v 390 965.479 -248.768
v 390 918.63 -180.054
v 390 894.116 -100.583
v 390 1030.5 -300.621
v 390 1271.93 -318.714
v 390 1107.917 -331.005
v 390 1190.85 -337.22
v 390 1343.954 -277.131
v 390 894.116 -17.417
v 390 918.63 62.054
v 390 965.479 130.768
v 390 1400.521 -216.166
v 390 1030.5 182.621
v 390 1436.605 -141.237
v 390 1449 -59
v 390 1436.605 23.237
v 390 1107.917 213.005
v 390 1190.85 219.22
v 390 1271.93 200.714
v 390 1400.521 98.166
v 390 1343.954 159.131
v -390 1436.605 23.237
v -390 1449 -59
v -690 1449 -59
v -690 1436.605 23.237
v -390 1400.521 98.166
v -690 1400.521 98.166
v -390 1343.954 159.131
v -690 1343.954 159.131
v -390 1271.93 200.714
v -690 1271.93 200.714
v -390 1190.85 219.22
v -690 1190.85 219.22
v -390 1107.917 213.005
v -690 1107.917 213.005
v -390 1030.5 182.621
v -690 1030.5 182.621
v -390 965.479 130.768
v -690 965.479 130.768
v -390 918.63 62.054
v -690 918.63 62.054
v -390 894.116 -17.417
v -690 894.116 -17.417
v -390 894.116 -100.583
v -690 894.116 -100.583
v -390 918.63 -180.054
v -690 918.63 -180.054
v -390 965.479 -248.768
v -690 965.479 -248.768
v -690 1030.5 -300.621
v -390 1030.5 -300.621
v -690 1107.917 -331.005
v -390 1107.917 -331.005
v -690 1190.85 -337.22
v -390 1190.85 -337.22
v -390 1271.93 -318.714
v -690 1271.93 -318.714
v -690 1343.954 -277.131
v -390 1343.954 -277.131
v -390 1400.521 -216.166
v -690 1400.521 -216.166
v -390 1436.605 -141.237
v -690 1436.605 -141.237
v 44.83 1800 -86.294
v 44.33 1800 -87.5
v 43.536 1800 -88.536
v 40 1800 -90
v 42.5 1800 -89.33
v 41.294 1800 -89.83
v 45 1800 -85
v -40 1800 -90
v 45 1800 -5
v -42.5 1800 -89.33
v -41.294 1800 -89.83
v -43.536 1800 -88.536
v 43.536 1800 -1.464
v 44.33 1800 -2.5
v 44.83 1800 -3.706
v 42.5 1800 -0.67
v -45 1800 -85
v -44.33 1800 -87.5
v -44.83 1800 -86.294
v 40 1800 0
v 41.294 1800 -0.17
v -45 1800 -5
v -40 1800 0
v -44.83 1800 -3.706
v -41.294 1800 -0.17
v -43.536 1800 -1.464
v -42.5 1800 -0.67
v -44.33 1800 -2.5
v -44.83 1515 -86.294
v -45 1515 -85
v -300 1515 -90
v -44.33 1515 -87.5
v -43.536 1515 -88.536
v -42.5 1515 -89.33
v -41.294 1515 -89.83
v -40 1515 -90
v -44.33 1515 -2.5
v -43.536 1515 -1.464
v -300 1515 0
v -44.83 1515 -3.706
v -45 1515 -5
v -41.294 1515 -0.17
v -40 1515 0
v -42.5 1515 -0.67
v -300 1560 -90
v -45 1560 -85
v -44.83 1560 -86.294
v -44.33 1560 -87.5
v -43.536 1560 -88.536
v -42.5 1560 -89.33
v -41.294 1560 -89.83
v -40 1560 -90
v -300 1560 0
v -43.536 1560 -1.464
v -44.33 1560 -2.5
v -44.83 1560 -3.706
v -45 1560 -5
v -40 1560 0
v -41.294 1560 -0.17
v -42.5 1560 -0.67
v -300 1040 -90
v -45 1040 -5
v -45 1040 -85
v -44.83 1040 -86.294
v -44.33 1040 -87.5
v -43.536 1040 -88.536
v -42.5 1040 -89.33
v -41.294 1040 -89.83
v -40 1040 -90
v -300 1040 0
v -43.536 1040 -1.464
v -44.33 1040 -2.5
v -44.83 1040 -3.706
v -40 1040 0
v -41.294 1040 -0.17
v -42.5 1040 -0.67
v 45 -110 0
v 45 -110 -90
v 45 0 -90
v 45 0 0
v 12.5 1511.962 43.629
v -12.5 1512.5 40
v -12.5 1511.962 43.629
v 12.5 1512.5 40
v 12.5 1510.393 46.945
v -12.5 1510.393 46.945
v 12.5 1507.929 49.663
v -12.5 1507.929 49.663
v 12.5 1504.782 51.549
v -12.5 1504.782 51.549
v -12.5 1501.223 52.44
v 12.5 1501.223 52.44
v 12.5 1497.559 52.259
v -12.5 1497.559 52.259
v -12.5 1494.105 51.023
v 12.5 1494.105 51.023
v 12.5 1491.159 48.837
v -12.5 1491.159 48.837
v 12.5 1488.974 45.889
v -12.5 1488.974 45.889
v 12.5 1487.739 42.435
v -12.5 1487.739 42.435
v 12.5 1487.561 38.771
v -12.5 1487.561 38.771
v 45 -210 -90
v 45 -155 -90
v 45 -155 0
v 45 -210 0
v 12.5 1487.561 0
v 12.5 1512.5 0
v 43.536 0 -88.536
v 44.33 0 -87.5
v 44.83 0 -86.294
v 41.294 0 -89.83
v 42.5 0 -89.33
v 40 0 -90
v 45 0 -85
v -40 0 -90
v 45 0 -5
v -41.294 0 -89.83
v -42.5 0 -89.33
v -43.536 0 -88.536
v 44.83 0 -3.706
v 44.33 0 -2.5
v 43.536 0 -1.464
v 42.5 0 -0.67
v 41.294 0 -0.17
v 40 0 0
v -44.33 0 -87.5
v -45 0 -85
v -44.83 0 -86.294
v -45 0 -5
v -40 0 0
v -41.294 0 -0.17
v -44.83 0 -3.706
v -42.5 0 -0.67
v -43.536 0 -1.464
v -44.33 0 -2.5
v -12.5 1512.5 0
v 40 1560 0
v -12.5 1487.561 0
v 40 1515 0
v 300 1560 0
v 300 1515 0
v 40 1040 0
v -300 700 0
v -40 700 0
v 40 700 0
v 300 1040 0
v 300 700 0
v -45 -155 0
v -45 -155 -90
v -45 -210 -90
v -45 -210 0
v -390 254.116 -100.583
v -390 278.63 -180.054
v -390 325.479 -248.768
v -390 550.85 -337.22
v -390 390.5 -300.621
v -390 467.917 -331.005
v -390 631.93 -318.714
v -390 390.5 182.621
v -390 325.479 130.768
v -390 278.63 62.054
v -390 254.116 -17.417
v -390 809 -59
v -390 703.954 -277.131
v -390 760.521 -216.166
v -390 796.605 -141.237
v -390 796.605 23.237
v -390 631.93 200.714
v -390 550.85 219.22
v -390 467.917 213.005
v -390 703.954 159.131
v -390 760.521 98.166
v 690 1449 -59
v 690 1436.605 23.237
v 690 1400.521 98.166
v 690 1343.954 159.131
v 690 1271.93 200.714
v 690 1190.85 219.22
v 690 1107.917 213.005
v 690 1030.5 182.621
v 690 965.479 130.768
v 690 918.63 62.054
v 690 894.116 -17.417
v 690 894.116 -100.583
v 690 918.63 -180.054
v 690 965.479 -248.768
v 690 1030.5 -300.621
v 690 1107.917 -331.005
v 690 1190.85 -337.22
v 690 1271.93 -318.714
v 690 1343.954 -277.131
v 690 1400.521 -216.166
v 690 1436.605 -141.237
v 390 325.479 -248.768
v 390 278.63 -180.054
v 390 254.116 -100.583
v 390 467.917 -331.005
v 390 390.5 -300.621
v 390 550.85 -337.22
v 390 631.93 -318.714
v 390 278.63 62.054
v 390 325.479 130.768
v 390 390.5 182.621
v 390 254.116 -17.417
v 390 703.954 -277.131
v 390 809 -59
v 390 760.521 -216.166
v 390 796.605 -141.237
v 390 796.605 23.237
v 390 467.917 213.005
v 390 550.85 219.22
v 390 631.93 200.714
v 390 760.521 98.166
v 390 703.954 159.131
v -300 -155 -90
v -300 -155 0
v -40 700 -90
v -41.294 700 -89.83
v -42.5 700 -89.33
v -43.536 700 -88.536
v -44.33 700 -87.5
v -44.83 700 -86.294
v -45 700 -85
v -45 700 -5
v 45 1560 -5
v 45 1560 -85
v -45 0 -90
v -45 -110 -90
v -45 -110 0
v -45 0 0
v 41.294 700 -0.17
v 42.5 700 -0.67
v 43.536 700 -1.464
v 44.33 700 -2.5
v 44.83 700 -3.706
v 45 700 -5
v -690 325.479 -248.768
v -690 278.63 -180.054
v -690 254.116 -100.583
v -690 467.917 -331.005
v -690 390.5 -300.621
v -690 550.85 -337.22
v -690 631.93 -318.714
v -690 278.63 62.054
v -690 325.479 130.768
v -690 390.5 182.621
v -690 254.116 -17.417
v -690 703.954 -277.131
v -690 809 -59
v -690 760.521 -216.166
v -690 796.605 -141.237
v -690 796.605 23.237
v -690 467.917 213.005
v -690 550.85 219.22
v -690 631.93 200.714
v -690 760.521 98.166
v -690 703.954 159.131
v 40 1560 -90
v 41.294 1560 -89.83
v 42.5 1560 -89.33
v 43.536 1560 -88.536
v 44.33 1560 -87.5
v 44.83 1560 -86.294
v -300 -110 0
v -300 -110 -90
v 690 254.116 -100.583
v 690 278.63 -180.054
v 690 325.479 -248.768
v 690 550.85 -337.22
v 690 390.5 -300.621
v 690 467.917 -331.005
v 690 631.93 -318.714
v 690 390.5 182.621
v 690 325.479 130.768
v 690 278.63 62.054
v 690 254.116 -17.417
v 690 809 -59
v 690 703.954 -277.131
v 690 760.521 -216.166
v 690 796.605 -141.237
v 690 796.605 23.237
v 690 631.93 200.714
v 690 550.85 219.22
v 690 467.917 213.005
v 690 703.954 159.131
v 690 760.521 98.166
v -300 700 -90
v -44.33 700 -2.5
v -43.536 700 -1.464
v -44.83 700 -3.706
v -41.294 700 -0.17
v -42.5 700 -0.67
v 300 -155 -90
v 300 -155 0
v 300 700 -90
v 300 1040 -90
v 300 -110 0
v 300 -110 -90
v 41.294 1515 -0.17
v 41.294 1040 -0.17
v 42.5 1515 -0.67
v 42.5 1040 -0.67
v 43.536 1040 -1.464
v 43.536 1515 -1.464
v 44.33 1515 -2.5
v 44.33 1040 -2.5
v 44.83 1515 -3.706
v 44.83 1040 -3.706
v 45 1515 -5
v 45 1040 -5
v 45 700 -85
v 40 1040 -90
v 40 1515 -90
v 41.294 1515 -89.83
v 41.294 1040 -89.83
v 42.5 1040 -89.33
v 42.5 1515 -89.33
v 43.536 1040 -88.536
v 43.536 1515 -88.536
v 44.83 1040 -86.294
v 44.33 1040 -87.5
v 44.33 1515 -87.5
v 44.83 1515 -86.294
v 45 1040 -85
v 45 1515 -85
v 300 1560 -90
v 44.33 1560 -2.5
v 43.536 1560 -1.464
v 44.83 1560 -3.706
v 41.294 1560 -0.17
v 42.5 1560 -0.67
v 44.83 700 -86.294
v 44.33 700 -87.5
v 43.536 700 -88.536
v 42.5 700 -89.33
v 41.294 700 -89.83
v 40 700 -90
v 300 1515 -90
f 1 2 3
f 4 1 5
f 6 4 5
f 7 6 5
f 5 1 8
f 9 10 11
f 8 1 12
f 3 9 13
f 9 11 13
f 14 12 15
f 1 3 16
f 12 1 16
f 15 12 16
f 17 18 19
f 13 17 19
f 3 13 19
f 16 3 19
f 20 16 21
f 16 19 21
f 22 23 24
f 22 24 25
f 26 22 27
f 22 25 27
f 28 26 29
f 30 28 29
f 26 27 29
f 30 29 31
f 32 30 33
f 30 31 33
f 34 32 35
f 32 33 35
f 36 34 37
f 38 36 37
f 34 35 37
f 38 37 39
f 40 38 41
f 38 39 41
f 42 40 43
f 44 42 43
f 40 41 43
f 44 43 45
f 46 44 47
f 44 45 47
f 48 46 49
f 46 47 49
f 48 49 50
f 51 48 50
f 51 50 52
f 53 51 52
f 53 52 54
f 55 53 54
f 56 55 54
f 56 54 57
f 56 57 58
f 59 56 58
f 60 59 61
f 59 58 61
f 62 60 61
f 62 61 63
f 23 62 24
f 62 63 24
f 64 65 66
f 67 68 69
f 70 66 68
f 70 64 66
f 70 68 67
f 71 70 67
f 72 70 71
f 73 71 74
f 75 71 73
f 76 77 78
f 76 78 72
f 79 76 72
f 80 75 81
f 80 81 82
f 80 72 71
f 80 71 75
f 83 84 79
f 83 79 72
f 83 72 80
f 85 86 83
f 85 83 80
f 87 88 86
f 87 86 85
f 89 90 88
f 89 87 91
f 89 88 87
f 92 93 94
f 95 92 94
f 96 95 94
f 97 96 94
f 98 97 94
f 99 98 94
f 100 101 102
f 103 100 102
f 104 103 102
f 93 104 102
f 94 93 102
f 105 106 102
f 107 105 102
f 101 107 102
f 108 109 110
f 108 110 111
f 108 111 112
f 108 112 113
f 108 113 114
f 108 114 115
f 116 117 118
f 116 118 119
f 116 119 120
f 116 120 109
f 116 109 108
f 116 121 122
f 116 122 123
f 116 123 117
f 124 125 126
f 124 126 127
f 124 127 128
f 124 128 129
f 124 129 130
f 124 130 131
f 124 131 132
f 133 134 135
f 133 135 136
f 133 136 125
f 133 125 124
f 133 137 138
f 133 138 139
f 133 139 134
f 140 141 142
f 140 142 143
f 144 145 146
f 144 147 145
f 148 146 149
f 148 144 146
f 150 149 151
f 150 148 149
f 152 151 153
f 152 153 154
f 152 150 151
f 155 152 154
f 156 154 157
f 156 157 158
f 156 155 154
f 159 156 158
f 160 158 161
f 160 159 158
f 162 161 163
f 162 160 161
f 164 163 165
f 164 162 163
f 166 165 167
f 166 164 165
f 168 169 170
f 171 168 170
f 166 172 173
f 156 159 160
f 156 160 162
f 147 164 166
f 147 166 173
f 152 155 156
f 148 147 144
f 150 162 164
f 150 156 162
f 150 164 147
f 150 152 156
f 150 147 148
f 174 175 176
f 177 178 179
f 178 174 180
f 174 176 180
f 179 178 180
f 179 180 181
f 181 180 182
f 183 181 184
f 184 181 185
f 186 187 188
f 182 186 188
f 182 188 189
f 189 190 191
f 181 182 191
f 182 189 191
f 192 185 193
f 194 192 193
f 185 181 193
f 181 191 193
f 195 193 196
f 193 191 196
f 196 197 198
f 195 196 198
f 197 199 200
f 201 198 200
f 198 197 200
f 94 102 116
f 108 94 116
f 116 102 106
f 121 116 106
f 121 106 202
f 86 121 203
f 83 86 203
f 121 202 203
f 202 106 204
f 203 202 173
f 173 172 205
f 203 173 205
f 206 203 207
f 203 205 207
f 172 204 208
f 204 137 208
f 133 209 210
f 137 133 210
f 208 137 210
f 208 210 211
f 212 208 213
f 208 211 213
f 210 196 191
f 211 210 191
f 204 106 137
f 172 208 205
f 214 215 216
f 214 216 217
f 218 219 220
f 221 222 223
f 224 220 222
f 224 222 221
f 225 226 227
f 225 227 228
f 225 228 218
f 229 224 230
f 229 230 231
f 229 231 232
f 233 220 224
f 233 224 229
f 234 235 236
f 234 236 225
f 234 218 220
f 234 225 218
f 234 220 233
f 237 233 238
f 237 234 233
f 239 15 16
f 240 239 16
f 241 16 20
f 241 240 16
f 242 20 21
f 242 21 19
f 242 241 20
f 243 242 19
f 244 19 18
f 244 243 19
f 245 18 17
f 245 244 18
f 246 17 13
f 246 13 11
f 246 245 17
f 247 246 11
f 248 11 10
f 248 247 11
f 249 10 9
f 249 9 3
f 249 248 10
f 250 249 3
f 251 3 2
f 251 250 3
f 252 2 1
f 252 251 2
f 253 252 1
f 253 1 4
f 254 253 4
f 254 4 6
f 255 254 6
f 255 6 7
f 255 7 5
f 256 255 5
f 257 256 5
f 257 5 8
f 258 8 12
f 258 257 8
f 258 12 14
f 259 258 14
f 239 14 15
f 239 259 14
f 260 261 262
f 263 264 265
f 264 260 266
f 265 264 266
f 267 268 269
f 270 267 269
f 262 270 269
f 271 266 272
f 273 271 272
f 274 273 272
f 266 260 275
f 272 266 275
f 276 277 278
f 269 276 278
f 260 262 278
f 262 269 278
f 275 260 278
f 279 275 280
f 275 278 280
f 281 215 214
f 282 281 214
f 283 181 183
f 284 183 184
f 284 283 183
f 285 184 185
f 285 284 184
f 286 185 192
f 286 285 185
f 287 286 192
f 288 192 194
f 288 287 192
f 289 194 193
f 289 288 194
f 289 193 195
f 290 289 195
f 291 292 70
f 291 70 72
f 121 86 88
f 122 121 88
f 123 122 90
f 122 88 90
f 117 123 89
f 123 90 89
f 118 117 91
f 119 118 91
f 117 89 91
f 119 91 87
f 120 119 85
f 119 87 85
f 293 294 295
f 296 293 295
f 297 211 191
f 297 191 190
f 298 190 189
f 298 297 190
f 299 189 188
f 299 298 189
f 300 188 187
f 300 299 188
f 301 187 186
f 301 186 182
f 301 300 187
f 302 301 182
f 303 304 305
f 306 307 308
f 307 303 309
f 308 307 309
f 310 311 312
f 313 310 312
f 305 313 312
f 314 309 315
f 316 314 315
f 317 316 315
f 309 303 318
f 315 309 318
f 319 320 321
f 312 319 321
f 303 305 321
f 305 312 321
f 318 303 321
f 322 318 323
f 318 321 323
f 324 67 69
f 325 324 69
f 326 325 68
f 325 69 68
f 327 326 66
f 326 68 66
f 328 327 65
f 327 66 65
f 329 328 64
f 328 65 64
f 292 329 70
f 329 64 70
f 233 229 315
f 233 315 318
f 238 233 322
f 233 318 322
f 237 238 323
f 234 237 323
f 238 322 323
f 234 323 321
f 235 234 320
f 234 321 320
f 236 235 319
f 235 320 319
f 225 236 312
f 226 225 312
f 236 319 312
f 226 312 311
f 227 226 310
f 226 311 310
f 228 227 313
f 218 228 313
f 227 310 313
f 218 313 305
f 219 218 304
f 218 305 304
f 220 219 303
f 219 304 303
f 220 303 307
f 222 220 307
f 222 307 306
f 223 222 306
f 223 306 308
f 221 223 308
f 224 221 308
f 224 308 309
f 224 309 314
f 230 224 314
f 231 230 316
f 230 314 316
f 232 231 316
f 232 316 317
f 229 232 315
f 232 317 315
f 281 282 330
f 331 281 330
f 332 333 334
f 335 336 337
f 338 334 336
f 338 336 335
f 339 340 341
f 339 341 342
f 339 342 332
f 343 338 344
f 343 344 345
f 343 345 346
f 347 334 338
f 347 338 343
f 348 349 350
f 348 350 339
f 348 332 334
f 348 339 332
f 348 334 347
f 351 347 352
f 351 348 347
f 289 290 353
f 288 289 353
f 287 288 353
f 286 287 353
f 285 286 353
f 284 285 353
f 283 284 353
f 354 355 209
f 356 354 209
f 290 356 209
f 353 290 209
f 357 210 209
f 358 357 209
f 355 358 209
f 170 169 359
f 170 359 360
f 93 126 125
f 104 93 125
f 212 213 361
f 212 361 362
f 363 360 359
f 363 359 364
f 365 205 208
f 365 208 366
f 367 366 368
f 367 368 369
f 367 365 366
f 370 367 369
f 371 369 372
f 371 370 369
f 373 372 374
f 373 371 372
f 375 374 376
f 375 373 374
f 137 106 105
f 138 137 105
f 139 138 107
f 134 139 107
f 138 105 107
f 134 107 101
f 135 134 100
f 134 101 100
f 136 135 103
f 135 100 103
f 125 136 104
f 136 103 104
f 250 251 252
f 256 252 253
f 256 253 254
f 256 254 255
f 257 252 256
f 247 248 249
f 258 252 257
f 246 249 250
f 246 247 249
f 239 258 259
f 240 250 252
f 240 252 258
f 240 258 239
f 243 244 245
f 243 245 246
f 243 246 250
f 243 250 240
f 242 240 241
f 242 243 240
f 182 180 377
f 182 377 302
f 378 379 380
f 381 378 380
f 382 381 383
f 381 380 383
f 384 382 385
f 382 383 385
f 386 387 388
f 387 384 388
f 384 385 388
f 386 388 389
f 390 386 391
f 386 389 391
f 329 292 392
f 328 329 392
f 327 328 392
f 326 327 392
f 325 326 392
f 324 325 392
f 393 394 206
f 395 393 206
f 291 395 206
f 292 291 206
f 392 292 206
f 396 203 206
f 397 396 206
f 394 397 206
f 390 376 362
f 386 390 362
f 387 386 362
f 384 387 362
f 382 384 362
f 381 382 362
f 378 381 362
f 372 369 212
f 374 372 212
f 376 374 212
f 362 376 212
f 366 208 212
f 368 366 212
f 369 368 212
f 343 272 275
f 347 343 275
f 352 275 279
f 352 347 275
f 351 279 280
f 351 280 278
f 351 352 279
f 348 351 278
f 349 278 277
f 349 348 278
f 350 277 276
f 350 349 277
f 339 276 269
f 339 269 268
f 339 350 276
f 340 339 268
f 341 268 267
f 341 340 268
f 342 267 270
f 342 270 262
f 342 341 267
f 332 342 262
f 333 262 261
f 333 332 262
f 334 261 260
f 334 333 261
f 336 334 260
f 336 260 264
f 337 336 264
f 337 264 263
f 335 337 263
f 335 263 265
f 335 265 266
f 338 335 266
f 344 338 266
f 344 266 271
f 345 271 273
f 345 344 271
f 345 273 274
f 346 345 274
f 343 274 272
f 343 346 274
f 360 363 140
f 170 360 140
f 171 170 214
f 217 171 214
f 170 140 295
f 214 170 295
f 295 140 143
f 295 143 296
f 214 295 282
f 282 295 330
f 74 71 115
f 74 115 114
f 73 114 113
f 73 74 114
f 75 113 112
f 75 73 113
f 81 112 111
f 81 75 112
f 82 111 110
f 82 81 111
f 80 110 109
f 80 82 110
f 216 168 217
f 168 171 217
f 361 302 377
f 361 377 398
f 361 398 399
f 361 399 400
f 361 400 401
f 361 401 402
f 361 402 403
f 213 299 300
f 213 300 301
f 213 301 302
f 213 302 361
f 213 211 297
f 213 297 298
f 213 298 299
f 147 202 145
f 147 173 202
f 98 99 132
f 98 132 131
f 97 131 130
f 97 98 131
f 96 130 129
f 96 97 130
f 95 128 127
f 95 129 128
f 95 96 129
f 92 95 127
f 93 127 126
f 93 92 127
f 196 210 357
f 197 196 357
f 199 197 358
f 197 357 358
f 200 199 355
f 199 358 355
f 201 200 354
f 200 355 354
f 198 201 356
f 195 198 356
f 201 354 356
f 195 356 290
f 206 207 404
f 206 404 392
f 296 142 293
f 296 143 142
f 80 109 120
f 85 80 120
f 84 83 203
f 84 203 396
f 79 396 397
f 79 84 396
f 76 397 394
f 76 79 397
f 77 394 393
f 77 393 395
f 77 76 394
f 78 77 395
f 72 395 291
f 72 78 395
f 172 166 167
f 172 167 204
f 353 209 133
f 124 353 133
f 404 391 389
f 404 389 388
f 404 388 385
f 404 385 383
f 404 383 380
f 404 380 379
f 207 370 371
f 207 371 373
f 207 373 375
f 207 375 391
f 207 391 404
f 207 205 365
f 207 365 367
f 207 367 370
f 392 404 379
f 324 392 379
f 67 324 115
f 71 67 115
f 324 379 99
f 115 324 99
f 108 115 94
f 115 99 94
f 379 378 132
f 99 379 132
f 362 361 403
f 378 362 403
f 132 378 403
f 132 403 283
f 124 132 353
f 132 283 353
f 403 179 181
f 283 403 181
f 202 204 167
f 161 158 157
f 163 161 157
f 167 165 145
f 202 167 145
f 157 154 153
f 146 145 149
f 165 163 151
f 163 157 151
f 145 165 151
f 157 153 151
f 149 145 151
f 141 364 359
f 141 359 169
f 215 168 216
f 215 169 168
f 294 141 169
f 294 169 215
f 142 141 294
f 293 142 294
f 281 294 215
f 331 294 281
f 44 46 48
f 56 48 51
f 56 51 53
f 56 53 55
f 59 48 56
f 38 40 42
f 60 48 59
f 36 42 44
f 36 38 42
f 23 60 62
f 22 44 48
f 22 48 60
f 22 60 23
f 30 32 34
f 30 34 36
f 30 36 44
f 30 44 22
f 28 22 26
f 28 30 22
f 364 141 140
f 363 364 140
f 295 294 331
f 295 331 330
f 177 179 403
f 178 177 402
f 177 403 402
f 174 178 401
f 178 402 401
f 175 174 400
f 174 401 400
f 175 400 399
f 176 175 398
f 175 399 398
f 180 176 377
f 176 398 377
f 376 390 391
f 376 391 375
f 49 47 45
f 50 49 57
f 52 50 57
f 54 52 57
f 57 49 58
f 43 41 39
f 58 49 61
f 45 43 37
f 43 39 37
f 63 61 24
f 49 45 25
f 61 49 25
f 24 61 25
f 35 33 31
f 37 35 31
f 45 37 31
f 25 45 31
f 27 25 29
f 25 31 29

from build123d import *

# Parameters (mm, degrees)
F1_DEPTH  = 1800
F2_R      = 5
F3_W      = 296.1497008801
F3_H      = 45
F4_DEPTH  = 90
F5_W      = 300
F5_H      = 340
F6_DEPTH  = 90
F8_R      = 279
F9_DEPTH  = 300
F12_W     = 45
F12_H     = 90
F13_DEPTH = 210
F14_W     = 45
F14_H     = 90
F15_DEPTH = 300
F18_DEPTH = 12.5


with BuildPart() as f1:
    # F0 (on Front) → F1 (new body)
    with BuildSketch(Plane.XZ):
        Polygon((45, -89.4697085023), (45, 0), (0, 0), (0, -90), (45, -90), align=None)
    extrude(amount=-F1_DEPTH)

    # F2
    f2_edges = [f1.edges().sort_by_distance(p)[0] for p in [
        (45, 900, 0),
        (45, 900, -90),
    ]]
    fillet(f2_edges, radius=F2_R)

    # F3 (on Top) → F4 (join)
    with BuildSketch(Plane.XY):
        with Locations((151.92514956, 1537.5)):
            Rectangle(F3_W, F3_H)
    extrude(amount=-F4_DEPTH)

    # F5 (on Top) → F6 (join)
    with BuildSketch(Plane.XY):
        with Locations((150, 870)):
            Rectangle(F5_W, F5_H)
    extrude(amount=-F6_DEPTH)

    # F10: F1 across plane


with BuildPart() as f9:
    # F8 (on offset) → F9 (new body)
    with BuildSketch(Plane.YZ.offset(690)):
        with Locations((530, -59)):
            Circle(F8_R)
    extrude(amount=-F9_DEPTH)


with BuildPart() as f9b:
    # F8 (on offset) → F9, piece 2 (new body)
    with BuildSketch(Plane.YZ.offset(690)):
        with Locations((1170, -59)):
            Circle(F8_R)
    extrude(amount=-F9_DEPTH)


with BuildPart() as f1_1:
    add(f1.part)
    add(f1.part.mirror(Plane.YZ))

    # F17 (on Right) → F18 (join, symmetric)
    with BuildSketch(Plane.YZ):
        with BuildLine():
            ThreePointArc((1487.5605972138, 38.7706675292), (1500.6154125336, 27.5151584947), (1512.5, 40))
            ThreePointArc((1512.5, 40), (1499.3845874664, 52.4848415053), (1487.5605972138, 38.7706675292))
        make_face()
        with BuildLine():
            Line((1512.5, 0), (1512.5, 40))
            ThreePointArc((1512.5, 40), (1500.6154125336, 27.5151584947), (1487.5605972138, 38.7706675292))
            Line((1487.5605972138, 38.7706675292), (1487.5605972138, 0))
            Line((1487.5605972138, 0), (1512.5, 0))
        make_face()
    extrude(amount=F18_DEPTH, both=True)


with BuildPart() as f11_1:
    # F11: instance of F9b
    add(f9b.part.mirror(Plane.YZ))


with BuildPart() as f11_2:
    # F11: instance of F9
    add(f9.part.mirror(Plane.YZ))


with BuildPart() as f13:
    # F12 (on Front) → F13 (new body)
    with BuildSketch(Plane.XZ):
        with Locations((22.5, -45)):
            Rectangle(F12_W, F12_H)
    extrude(amount=F13_DEPTH)

    # F14 (on Right) → F15 (join)
    with BuildSketch(Plane.YZ):
        with Locations((-132.5, -45)):
            Rectangle(F14_W, F14_H)
    extrude(amount=F15_DEPTH)

    # F16: F13 across plane


with BuildPart() as f13_1:
    add(f13.part)
    add(f13.part.mirror(Plane.YZ))


solid = Compound([f9.part, f9b.part, f1_1.part, f11_1.part, f11_2.part, f13_1.part])
